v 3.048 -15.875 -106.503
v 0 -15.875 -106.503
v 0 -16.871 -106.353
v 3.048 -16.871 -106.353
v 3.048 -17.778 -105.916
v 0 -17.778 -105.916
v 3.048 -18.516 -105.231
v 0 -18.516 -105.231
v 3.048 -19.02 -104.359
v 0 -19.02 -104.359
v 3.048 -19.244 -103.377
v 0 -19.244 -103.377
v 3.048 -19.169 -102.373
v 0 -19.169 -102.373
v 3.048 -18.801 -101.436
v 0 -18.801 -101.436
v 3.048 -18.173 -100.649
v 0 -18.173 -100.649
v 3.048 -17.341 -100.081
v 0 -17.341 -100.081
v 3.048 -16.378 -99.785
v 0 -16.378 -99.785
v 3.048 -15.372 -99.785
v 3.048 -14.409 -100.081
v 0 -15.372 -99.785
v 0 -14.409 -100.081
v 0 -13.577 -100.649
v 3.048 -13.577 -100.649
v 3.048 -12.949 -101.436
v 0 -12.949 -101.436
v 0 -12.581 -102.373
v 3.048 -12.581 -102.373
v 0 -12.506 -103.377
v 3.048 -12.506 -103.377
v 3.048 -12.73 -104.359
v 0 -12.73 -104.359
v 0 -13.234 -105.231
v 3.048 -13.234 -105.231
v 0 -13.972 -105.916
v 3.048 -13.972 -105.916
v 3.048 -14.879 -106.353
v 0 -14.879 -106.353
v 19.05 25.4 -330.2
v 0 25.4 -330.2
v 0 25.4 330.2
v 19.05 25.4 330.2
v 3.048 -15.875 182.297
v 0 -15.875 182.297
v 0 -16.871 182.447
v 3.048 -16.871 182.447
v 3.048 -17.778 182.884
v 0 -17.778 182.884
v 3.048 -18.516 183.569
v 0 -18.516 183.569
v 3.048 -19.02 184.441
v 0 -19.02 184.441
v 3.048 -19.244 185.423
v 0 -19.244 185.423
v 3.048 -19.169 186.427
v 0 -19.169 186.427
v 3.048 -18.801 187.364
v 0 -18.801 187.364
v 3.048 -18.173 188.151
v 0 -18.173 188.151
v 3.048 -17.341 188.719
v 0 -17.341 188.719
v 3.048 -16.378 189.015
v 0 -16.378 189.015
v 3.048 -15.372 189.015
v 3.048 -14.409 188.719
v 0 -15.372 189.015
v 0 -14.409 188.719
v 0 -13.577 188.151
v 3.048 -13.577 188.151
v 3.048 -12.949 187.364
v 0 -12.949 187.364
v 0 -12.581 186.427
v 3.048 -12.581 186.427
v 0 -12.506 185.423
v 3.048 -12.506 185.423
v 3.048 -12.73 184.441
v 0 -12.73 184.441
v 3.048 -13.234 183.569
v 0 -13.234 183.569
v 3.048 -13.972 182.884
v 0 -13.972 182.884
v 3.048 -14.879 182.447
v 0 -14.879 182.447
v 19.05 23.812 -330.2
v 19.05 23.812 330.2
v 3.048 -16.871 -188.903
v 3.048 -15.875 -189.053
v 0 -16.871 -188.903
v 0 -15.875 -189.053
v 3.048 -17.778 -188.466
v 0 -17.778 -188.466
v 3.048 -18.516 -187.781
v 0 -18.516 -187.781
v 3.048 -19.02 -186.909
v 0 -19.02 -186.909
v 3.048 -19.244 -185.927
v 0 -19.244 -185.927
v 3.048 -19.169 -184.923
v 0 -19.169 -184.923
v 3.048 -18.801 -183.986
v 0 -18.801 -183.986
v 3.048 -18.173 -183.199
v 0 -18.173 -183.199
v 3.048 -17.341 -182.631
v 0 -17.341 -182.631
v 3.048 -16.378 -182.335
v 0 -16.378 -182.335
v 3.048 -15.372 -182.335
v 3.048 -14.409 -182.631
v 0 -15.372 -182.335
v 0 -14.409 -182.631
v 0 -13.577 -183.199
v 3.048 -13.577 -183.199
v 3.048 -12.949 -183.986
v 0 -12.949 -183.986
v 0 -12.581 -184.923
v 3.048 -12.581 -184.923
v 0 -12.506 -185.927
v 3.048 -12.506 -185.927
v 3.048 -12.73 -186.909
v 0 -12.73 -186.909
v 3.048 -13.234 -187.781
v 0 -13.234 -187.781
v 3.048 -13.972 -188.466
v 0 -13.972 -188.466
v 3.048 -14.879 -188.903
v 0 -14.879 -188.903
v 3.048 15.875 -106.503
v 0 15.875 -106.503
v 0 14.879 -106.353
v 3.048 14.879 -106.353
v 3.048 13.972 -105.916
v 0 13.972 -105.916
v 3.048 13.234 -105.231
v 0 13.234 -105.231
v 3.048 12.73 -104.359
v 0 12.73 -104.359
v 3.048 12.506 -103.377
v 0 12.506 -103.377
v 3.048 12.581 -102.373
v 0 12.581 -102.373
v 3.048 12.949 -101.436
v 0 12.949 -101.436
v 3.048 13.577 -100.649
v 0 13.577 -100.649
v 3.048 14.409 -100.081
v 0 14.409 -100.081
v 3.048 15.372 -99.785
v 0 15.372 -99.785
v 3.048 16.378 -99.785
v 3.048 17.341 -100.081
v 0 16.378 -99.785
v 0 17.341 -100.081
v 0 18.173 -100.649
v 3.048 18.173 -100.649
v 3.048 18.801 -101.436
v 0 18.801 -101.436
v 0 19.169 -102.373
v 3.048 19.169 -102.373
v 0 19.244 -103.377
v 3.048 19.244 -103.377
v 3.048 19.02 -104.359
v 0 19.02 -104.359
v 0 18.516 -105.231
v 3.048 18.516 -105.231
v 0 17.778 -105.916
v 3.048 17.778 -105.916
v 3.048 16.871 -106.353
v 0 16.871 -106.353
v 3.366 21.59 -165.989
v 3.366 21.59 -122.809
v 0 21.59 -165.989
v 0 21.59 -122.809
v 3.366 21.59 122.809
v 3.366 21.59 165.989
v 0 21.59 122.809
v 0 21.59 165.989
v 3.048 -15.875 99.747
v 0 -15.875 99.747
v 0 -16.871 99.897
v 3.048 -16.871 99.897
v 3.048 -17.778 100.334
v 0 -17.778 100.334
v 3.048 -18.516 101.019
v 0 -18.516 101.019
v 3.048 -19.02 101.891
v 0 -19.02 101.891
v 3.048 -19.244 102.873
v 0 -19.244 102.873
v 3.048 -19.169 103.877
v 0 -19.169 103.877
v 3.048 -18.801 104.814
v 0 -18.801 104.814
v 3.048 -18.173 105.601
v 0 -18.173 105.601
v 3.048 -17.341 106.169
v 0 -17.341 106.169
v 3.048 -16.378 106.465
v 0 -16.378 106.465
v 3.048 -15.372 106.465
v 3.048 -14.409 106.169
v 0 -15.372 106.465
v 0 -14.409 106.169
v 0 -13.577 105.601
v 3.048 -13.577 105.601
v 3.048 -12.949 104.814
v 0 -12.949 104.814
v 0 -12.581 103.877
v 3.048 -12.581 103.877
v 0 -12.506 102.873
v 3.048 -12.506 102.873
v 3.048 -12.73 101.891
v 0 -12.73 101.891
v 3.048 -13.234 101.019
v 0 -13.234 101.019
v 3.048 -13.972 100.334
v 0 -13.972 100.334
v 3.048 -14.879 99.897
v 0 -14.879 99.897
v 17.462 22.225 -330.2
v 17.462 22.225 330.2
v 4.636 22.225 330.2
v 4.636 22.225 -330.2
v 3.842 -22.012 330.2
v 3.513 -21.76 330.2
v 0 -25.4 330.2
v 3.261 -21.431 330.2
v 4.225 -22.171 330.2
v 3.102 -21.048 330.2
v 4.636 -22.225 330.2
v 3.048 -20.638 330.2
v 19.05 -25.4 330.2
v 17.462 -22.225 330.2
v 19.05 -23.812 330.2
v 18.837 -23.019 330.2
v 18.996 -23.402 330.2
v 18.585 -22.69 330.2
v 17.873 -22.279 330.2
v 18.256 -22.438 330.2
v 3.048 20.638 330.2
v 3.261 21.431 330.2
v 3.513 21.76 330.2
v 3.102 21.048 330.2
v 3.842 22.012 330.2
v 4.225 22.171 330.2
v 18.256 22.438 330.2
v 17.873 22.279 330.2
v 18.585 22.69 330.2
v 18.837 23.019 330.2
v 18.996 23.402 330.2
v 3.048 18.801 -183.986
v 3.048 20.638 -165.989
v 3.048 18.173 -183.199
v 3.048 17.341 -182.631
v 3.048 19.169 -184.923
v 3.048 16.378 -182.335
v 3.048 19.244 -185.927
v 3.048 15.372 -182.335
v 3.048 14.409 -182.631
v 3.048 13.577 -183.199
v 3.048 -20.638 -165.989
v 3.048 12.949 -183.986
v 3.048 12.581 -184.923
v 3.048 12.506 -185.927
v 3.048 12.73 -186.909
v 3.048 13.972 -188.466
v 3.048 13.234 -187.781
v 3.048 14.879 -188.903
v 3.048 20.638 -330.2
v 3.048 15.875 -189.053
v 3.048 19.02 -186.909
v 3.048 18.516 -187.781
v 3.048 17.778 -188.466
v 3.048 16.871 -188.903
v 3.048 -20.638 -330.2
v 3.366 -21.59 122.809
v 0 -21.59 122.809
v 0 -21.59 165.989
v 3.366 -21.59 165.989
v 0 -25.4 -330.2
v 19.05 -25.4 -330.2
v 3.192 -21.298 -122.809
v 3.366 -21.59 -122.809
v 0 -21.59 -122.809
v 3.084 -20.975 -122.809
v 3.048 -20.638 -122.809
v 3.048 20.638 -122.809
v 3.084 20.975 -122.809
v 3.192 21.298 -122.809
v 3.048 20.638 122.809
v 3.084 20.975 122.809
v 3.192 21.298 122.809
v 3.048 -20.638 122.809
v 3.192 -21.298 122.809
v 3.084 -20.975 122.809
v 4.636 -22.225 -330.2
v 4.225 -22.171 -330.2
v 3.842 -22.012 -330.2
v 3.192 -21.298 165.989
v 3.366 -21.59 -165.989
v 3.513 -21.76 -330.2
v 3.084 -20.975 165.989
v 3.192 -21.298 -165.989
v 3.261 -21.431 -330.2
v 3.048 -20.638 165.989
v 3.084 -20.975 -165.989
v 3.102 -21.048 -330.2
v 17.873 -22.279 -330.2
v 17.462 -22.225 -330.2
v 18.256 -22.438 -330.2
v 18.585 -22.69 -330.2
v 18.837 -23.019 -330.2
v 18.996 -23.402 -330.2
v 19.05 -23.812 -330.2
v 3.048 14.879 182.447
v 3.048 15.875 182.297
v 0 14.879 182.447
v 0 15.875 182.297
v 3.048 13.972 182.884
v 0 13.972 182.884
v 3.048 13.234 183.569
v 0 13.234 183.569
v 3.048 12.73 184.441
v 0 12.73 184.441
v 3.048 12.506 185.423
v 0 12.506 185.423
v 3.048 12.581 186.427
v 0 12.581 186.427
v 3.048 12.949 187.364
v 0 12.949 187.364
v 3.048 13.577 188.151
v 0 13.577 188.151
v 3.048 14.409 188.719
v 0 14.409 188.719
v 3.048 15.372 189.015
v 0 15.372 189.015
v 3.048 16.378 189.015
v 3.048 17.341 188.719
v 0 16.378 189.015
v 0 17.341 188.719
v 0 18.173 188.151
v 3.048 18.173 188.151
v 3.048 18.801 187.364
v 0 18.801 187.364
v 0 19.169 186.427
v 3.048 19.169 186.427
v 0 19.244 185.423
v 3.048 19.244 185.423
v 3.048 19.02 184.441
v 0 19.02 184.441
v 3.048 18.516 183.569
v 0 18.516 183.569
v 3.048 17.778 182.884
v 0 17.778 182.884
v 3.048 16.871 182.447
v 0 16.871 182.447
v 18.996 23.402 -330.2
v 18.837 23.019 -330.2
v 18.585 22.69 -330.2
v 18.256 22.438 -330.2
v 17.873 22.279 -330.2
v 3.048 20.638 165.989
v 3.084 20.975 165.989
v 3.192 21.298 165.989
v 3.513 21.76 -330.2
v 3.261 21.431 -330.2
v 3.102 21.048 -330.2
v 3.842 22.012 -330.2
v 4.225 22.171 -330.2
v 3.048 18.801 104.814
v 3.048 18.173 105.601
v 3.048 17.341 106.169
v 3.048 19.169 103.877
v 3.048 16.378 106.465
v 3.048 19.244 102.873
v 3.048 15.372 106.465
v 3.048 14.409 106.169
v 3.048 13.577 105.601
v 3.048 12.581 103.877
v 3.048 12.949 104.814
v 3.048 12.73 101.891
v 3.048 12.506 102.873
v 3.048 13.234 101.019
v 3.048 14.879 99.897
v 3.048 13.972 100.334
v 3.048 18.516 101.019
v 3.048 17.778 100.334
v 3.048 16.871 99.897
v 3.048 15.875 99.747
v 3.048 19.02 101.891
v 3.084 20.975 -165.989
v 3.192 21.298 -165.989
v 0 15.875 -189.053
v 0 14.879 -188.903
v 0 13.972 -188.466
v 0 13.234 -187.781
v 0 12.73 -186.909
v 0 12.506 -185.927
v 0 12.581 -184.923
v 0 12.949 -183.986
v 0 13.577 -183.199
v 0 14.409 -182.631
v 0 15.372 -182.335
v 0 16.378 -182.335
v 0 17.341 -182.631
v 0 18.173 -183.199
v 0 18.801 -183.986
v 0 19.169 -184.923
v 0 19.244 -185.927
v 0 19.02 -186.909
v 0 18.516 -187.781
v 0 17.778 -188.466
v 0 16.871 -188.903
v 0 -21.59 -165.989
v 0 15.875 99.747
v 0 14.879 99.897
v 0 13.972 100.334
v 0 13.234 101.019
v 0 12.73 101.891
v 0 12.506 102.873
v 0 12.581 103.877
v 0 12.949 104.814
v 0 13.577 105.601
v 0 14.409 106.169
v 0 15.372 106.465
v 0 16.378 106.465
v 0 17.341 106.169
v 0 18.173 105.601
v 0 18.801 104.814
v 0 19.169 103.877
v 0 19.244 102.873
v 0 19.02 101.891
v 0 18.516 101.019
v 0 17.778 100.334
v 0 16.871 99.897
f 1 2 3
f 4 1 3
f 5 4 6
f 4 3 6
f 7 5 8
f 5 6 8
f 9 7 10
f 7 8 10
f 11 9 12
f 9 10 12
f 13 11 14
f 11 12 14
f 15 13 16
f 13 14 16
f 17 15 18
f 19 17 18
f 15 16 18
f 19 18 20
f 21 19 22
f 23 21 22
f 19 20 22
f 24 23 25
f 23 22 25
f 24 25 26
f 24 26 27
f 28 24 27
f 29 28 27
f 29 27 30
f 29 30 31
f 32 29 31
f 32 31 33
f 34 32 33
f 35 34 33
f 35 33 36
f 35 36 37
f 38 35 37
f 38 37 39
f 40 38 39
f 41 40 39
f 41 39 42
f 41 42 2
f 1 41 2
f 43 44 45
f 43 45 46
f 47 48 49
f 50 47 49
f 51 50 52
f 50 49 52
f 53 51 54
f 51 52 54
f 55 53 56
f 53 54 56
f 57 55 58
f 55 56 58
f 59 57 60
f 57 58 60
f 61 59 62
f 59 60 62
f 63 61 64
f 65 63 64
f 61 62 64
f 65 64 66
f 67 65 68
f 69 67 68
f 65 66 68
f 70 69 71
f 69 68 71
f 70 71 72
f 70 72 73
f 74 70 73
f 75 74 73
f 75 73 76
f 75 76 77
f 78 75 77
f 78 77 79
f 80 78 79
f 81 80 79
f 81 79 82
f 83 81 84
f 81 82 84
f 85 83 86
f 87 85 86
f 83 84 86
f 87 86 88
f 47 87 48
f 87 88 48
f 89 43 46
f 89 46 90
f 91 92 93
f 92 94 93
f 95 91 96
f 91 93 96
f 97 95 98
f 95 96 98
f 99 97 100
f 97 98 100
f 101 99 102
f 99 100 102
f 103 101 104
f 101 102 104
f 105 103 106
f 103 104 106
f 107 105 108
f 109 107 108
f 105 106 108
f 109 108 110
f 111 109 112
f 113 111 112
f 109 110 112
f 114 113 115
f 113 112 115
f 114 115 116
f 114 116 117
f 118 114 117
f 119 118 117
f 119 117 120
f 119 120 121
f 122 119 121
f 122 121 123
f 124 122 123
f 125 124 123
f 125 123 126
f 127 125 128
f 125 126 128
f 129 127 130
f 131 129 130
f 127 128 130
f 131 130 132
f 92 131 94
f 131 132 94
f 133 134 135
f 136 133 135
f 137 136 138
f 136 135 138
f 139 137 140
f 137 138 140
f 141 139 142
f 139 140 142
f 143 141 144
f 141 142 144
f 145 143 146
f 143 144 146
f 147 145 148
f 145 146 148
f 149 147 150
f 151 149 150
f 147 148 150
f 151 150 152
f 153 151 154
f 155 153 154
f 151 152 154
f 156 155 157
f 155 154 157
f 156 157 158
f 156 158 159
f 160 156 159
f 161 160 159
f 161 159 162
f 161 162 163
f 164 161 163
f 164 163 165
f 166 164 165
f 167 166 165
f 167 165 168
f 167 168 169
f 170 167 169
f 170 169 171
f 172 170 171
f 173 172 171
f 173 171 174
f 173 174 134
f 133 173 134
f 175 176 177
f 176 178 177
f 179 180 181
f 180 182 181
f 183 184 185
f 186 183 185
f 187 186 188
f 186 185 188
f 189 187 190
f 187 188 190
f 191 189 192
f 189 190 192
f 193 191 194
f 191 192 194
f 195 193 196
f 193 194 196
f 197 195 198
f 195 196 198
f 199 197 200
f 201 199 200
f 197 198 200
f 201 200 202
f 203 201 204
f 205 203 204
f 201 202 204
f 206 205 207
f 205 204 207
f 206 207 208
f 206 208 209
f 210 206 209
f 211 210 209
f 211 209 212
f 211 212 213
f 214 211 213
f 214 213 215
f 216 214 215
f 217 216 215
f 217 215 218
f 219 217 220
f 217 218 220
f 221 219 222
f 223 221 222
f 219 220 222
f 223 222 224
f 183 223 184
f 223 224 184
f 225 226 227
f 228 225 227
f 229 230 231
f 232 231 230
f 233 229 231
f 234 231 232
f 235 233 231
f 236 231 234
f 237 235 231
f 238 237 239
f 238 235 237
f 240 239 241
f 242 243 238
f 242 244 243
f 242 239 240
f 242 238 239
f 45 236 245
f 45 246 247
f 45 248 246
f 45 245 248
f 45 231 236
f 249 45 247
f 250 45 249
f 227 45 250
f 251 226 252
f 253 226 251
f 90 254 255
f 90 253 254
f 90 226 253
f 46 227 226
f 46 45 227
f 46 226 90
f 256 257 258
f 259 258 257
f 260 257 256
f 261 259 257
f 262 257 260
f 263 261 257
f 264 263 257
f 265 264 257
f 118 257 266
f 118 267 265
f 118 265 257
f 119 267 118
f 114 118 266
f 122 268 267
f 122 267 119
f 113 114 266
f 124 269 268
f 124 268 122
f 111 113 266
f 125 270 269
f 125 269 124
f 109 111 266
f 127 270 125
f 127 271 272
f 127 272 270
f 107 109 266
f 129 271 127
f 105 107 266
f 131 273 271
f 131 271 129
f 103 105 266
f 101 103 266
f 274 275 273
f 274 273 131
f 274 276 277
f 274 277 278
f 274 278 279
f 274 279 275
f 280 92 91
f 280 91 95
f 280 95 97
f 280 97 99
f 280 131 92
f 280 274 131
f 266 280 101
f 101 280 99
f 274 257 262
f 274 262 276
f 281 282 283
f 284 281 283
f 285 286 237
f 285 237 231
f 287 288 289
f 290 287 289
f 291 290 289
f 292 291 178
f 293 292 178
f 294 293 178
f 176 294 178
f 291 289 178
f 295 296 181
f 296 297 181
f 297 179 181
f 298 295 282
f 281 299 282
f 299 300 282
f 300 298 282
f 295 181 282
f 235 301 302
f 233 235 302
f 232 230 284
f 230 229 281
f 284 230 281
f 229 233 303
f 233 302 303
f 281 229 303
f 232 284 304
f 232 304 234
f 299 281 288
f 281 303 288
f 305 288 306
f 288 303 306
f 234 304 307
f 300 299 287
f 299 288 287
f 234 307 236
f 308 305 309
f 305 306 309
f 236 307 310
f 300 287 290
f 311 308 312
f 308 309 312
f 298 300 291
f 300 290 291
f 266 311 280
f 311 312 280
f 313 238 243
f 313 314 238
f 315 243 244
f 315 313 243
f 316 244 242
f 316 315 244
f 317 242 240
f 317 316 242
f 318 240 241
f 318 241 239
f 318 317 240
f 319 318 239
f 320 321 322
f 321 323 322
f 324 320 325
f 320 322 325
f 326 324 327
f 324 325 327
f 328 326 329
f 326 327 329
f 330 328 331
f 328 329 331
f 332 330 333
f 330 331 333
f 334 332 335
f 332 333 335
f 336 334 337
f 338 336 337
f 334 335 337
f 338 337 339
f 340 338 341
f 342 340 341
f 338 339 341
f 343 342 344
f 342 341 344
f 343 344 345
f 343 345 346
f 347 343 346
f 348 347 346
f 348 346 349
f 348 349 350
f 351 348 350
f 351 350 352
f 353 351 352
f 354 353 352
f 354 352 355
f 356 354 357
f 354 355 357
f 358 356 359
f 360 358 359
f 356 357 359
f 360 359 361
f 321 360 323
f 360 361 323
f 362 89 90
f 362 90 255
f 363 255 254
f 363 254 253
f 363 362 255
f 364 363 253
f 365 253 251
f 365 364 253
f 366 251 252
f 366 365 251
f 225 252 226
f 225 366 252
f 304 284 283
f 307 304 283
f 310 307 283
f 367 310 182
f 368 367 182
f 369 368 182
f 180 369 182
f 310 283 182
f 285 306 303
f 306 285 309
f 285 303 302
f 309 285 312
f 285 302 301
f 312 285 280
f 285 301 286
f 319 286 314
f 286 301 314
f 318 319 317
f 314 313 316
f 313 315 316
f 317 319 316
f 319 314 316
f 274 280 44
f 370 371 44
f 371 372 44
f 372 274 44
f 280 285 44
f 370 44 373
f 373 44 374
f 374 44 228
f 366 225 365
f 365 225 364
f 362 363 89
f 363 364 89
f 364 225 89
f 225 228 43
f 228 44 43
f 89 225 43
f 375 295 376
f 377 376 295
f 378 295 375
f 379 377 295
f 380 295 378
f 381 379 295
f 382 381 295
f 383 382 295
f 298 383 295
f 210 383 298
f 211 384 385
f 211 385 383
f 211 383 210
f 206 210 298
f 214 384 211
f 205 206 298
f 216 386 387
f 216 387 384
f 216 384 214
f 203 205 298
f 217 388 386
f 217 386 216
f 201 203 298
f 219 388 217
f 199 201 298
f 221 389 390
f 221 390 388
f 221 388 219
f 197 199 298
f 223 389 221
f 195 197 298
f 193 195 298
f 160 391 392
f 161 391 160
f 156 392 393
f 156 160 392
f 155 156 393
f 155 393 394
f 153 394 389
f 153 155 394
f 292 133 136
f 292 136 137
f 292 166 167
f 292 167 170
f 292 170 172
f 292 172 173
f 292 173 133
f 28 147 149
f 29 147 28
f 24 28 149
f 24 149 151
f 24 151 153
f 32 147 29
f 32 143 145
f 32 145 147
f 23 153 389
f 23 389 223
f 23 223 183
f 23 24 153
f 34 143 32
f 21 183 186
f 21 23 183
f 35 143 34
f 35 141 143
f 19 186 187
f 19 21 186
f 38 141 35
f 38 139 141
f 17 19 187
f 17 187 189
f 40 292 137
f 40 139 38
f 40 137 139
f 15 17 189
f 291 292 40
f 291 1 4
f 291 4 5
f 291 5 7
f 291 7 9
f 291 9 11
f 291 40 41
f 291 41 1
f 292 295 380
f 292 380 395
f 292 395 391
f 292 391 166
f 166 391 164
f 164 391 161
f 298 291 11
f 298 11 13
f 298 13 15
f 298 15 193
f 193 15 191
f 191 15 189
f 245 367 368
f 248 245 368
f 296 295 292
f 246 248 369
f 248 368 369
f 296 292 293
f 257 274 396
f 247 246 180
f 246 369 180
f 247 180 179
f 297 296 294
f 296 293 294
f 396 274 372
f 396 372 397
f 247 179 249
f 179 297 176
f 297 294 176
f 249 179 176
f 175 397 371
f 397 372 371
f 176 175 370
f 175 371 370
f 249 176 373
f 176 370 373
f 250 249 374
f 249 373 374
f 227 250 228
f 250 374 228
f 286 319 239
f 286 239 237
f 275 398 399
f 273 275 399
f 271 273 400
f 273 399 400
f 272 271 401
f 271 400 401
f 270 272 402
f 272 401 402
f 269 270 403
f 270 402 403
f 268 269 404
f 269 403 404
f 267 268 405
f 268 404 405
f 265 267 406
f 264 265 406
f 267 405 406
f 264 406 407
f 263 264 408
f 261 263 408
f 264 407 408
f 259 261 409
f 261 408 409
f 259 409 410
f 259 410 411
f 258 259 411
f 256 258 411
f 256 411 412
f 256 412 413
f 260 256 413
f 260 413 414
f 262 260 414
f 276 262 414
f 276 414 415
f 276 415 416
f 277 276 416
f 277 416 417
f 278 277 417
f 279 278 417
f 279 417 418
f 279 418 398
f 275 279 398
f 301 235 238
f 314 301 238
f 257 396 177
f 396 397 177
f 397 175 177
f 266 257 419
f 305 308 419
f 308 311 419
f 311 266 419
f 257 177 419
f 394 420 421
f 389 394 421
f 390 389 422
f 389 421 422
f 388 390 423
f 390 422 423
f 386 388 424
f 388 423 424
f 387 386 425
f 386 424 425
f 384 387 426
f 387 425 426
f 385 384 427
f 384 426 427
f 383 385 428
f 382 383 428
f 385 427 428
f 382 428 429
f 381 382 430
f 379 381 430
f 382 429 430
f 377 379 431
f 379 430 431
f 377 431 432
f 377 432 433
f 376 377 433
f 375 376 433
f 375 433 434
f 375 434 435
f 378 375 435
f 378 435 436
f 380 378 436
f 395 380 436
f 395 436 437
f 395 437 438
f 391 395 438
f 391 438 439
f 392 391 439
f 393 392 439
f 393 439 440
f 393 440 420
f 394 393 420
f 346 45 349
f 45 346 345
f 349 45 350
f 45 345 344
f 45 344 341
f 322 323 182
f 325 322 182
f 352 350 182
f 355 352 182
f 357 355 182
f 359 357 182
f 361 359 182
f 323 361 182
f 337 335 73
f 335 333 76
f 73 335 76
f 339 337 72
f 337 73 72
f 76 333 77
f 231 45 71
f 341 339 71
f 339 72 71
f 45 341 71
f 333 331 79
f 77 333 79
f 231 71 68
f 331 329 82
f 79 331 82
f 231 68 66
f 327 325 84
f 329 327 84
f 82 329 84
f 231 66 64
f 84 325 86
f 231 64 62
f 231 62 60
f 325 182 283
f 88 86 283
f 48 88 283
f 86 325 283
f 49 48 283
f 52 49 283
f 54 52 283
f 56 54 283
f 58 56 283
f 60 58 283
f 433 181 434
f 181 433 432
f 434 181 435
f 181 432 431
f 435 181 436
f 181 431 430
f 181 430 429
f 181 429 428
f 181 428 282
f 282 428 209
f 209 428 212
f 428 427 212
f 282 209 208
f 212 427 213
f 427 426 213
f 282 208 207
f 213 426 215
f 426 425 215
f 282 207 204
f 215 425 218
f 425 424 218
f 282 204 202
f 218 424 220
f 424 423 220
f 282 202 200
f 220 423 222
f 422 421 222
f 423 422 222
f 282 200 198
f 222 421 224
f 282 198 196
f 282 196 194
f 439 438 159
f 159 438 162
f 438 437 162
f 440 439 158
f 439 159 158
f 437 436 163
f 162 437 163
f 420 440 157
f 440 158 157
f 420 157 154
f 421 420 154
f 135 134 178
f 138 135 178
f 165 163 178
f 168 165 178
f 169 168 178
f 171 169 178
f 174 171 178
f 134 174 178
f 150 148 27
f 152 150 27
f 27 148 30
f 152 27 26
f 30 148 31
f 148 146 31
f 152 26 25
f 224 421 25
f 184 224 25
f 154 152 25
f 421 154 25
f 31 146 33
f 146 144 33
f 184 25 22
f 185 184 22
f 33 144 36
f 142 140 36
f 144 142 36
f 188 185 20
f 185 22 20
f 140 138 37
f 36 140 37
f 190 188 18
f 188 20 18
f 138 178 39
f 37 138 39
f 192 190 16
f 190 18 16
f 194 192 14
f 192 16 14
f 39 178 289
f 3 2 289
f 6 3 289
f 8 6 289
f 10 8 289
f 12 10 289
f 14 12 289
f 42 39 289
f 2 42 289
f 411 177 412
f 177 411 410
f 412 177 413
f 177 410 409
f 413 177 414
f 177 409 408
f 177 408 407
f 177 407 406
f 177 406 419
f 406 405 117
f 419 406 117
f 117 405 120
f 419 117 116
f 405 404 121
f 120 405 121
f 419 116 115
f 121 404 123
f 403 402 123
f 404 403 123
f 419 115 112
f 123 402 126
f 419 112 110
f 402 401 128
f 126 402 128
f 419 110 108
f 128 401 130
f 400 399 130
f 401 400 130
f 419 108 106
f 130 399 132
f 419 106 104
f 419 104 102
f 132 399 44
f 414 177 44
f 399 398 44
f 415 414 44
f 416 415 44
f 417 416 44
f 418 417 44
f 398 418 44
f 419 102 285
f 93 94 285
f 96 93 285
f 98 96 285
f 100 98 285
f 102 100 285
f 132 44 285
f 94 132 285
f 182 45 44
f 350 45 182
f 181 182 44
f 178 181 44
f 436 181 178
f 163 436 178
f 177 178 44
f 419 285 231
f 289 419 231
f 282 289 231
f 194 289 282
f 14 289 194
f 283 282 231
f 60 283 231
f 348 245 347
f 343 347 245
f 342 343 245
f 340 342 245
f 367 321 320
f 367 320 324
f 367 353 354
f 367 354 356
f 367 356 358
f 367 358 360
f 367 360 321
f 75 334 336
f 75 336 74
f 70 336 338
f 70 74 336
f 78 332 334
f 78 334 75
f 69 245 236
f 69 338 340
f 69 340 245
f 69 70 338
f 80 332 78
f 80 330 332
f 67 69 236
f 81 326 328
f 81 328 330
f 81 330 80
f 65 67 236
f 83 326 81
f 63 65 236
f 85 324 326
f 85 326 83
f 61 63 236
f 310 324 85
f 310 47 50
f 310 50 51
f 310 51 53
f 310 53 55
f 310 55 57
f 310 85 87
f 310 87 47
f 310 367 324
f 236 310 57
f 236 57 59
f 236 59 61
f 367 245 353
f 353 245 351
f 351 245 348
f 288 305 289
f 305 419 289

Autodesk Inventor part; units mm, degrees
ref_plane "YZ Plane" through (0, 0, 0) normal (1, 0, 0) x (0, 1, 0)
ref_plane "XZ Plane" through (0, 0, 0) normal (0, 1, 0) x (-1, 0, 0)
ref_plane "XY Plane" through (0, 0, 0) normal (0, 0, 1) x (1, 0, 0)
sketch "Sketch3" plane through (0, 0, 0) normal (0, 0, 1) x (1, 0, 0)
  line L0 (0, 25.4) -> (0, -25.4)
  line L1 (0, 25.4) -> (19.05, 25.4)
  line L2 (19.05, 25.4) -> (19.05, 22.225)
  line L3 (19.05, 22.225) -> (3.048, 22.225)
  line L4 (3.048, 22.225) -> (3.048, -22.225)
  line L5 (3.048, -22.225) -> (19.05, -22.225)
  line L6 (19.05, -22.225) -> (19.05, -25.4)
  line L7 (19.05, -25.4) -> (0, -25.4)
  line L8 (0, 0) -> (3.048, 0) construction
  dimension "d7" = 50.8
  dimension "d10" = 19.05
  dimension "d33" = 3.175
  dimension "d34" = 16.002
extrude "Extrusion3" add sketch "Sketch3" along normal mid plane 660.4
fillet "Fillet1" radius 1.5875 4 edges at (19.05, 22.225, 0) (19.05, -22.225, 0) (3.048, -22.225, 0) (3.048, 22.225, 0)
sketch "Sketch6" plane through (0, -25.4, 330.2) normal (-1, 0, 0) x (0, 0, 1)
  line L0 (-496.189, 3.81) -> (-453.009, 3.81)
  line L1 (-453.009, 3.81) -> (-453.009, 46.99)
  line L2 (-453.009, 46.99) -> (-496.189, 46.99)
  line L3 (-496.189, 46.99) -> (-496.189, 3.81)
  line L4 (-496.189, 3.81) -> (-453.009, 46.99) construction
  line L5 (-453.009, 3.81) -> (-496.189, 46.99) construction
  line L6 (-207.391, 3.81) -> (-164.211, 3.81)
  line L7 (-164.211, 3.81) -> (-164.211, 46.99)
  line L8 (-164.211, 46.99) -> (-207.391, 46.99)
  line L9 (-207.391, 46.99) -> (-207.391, 3.81)
  line L10 (-207.391, 3.81) -> (-164.211, 46.99) construction
  line L11 (-164.211, 3.81) -> (-207.391, 46.99) construction
  point P0 (-330.2, 25.4)
  point P1 (-474.599, 25.4)
  point P2 (-185.801, 25.4)
  point P3 (-474.599, 25.4)
  point P4 (-185.801, 25.4)
  dimension "d35" = 288.798
  dimension "d36" = 144.399
  dimension "d37" = 43.18
extrude "Extrusion4" cut sketch "Sketch6" against normal through all
sketch "Sketch7" plane through (3.048, -20.6375, 330.2) normal (1, 0, 0) x (0, 0, -1)
  circle A0 centre (227.075, 4.7625) radius 2.4194 projected
  circle A1 centre (227.075, 36.5125) radius 2.4194 projected
  circle A2 centre (144.525, 4.7625) radius 2.4194 projected
  circle A3 centre (144.525, 36.5125) radius 2.4194 projected
  circle A4 centre (515.875, 4.7625) radius 2.4194 projected
  circle A5 centre (515.875, 36.5125) radius 2.4194 projected
  circle A6 centre (433.325, 4.7625) radius 2.4194 projected
  circle A7 centre (433.325, 36.5125) radius 2.4194 projected
  point P0 (330.2, 20.6375)
hole "Hole3" at (3.048, -15.875, -185.675) at (3.048, 15.875, -185.675) at (3.048, -15.875, -103.125) at (3.048, 15.875, -103.125) at (3.048, -15.875, 103.125) at (3.048, 15.875, 103.125) at (3.048, -15.875, 185.675) at (3.048, 15.875, 185.675) direction (-1, 0, 0) diameter 6.7564 end through all clearance for "Socket Head Cap Screw" size "1/4" standard "Ansi Unified Screw Threads"
equation "\"d11\" = Length"
equation "\"Length\" = 660.4"
properties part number "NASA-20-FR-SP-01" material "Aluminum 6061"
